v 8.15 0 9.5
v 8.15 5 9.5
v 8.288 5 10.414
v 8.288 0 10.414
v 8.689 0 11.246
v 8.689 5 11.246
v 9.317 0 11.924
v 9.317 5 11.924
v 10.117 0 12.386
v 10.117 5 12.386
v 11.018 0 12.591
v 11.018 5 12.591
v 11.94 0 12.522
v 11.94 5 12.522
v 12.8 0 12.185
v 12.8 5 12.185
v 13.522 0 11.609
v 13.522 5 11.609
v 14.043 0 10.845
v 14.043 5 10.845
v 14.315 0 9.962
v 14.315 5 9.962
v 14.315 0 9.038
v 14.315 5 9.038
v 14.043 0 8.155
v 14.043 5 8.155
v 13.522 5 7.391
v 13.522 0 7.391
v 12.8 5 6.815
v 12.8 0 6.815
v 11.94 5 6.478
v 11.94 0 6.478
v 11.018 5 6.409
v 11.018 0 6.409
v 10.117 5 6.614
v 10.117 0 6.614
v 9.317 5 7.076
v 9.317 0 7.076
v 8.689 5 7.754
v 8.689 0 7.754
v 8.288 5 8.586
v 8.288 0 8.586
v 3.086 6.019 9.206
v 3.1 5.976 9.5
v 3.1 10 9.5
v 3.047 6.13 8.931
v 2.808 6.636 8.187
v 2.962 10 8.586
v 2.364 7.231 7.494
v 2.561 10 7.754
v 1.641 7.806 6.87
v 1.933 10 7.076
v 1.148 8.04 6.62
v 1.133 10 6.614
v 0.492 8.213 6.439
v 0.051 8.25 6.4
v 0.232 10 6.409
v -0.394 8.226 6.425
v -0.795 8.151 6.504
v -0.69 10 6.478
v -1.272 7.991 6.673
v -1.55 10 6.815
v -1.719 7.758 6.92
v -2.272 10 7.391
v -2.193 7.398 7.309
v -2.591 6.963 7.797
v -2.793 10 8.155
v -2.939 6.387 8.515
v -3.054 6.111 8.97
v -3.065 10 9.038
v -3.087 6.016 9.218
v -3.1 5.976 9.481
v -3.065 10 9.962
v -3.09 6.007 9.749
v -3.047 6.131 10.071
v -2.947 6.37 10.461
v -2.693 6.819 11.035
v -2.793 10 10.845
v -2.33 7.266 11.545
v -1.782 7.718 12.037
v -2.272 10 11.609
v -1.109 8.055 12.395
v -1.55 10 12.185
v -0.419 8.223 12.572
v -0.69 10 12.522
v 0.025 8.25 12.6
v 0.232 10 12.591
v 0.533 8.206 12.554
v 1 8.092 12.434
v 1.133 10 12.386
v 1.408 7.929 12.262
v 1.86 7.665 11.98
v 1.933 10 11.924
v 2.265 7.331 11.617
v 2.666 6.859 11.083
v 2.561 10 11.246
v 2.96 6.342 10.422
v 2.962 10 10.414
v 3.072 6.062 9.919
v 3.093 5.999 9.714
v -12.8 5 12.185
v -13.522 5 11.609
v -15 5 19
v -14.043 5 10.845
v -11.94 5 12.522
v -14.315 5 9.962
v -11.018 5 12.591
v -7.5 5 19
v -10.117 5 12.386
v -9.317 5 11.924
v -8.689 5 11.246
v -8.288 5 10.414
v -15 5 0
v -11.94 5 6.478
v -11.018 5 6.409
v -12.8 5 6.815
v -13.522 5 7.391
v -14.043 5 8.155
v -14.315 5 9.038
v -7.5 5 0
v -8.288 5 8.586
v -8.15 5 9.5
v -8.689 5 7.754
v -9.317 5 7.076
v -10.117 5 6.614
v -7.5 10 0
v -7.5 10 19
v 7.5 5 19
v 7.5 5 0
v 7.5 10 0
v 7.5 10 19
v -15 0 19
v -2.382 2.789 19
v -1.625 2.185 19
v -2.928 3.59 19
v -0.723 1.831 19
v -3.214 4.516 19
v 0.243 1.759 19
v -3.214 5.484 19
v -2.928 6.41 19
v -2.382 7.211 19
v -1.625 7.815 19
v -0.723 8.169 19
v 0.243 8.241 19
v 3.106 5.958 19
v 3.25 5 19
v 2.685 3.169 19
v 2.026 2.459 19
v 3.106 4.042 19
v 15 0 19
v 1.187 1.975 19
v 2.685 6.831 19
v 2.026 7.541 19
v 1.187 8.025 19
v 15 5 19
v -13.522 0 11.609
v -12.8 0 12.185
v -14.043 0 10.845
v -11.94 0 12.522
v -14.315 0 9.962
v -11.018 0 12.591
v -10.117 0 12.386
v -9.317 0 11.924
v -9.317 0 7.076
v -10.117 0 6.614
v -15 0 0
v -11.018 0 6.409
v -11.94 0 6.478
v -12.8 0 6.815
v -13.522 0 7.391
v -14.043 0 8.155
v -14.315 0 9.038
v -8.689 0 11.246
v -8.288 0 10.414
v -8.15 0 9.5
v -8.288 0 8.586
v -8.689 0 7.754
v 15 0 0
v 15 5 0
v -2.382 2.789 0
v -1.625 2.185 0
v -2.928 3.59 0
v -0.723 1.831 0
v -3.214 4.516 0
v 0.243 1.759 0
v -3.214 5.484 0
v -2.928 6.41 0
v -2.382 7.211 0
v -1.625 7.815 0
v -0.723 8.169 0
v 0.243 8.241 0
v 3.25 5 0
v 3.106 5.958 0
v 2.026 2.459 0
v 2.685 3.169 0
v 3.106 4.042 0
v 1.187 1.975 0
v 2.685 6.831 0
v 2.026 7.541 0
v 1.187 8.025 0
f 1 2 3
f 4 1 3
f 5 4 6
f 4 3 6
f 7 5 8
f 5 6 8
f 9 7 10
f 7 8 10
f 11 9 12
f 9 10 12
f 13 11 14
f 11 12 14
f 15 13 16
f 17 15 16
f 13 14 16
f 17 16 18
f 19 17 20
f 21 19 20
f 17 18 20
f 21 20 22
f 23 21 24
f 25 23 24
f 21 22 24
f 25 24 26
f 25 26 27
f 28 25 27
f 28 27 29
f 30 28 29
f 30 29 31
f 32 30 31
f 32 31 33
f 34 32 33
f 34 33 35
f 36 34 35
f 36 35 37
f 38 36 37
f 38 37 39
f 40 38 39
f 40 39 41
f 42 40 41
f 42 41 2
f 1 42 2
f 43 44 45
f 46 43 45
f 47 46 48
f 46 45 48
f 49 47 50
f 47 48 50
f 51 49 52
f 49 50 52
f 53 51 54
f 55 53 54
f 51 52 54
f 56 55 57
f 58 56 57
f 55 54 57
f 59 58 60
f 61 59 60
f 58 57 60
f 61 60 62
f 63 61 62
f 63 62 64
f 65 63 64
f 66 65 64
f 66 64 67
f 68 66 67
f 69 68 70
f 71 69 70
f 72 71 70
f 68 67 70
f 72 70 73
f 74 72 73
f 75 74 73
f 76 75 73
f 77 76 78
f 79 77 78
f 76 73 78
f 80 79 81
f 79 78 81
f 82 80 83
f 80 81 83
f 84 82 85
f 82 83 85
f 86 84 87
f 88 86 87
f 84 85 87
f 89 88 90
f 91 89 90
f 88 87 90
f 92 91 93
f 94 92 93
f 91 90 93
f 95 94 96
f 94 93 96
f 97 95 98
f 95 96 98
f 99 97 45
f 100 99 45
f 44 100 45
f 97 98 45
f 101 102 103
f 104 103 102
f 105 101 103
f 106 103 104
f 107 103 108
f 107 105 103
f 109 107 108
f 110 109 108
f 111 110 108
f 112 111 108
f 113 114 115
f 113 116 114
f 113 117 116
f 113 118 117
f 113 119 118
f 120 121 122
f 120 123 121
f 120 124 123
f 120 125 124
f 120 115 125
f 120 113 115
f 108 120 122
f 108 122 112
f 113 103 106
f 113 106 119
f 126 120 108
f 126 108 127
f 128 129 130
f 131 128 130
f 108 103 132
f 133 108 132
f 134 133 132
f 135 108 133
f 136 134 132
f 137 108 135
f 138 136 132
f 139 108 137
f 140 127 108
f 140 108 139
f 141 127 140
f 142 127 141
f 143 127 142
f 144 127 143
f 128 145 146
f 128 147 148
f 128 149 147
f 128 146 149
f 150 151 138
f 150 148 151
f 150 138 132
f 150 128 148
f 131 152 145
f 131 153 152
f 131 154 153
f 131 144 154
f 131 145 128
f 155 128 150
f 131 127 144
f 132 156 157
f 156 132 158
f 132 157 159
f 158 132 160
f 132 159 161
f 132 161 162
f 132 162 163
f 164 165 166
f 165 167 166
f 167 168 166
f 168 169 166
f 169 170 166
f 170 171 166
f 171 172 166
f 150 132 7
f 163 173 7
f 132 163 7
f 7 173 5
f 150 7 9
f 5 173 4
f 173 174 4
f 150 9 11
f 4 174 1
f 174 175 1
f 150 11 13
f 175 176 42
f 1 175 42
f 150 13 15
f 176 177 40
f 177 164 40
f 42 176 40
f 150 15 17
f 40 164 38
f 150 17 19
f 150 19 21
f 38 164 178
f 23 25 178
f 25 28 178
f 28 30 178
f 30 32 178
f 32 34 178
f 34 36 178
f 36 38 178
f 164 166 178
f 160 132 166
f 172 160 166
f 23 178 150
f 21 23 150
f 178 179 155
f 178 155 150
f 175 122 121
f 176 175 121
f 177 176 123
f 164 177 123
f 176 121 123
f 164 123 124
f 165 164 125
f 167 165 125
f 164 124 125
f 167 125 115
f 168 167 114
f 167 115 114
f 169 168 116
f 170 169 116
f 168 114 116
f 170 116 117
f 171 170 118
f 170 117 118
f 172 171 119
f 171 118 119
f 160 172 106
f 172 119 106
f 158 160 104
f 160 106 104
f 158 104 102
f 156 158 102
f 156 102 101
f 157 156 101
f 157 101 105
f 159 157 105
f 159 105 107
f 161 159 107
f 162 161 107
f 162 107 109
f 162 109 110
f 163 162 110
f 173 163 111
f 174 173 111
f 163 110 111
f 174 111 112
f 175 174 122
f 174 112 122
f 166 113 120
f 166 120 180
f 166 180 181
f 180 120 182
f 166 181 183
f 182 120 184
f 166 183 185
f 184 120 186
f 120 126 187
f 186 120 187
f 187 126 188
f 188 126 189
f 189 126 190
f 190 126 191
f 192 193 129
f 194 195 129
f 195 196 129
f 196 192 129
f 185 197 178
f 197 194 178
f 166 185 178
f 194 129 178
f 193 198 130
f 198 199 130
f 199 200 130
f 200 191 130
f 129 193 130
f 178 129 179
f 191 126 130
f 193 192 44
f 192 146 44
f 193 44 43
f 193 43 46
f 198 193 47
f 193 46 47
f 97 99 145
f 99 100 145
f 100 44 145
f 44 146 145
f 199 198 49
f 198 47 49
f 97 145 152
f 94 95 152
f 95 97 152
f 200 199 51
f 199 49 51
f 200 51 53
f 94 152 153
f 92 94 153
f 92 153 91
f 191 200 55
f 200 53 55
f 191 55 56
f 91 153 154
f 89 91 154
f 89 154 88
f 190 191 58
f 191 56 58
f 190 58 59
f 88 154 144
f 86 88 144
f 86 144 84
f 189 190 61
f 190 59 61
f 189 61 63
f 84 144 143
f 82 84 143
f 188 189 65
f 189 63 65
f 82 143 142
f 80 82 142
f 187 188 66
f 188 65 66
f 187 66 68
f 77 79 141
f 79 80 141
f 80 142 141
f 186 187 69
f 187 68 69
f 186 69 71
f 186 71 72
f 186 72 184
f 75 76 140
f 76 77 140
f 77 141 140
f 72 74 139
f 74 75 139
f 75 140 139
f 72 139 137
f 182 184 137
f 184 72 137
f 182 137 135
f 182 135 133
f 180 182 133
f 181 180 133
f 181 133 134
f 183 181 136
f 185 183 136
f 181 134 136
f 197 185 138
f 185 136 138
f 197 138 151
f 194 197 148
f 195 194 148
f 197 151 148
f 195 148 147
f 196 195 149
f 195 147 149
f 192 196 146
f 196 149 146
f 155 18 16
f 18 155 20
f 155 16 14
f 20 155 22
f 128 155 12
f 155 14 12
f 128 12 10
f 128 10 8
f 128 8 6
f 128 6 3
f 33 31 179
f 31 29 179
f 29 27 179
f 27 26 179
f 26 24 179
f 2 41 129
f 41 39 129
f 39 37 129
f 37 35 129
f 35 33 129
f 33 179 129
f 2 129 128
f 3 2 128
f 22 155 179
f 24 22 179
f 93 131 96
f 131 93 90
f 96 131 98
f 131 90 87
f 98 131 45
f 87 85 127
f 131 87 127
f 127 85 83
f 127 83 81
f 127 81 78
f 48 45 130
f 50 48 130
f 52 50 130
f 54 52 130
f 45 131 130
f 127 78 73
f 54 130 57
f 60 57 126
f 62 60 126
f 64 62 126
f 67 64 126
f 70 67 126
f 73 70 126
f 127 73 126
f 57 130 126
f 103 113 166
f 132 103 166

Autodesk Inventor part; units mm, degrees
sketch "Sketch1" plane through (0, 0, 0) normal (0, 0, 1) x (1, 0, 0)
  line L0 (-15, 0) -> (15, 0)
  line L1 (-15, 5) -> (-15, 0)
  line L2 (15, 5) -> (15, 0)
  line L3 (15, 5) -> (7.5, 5)
  line L4 (-15, 5) -> (-7.5, 5)
  line L5 (-7.5, 5) -> (-7.5, 10)
  line L6 (7.5, 5) -> (7.5, 10)
  line L7 (7.5, 10) -> (-7.5, 10)
  point P0 (0, 0)
  point P1 (0, 0)
  dimension "d0" = 30
  dimension "d1" = 5
  dimension "d2" = 15
extrude "Extrusion1" add sketch "Sketch1" along normal blind 19
sketch "Sketch2" plane through (-15, 5, 0) normal (0, 1, 0) x (1, 0, 0)
  circle A0 centre (3.75, -9.5) radius 3.1
  line L0 (0, 0) -> (30, 0) projected
  line L1 (0, 0) -> (0, -19) projected
  line L2 (0, 0) -> (0, -19)
  line L3 (0, 0) -> (7.5, 0)
  point P0 (15, 0)
  point P1 (0, -9.5)
  point P2 (3.75, 0)
  dimension "d5" = 6.2
extrude "Extrusion2" cut sketch "Sketch2" against normal through all
mirror "Mirror1" about plane through (0, 0, 0) normal (1, 0, 0) of "Extrusion2"
sketch "Sketch3" plane through (0, 0, 19) normal (0, 0, 1) x (1, 0, 0)
  circle A0 centre (0, 5) radius 3.25
  line L0 (-15, 0) -> (15, 0) projected
  point P0 (0, 0)
  point P1 (0, 0)
  point P2 (-7.5, 5)
  dimension "d9" = 6.5
extrude "Extrusion3" cut sketch "Sketch3" against normal through all
sketch "Sketch4" plane through (-7.5, 10, 0) normal (0, 1, 0) x (1, 0, 0)
  circle A0 centre (7.5, -9.5) radius 3.1
  line L0 (15, 0) -> (0, 0) projected
  line L1 (0, 0) -> (0, -19) projected
  point P0 (7.5, 0)
  point P1 (7.5, 0)
  point P2 (0, -9.5)
  dimension "d12" = 6.2
extrude "Extrusion4" cut sketch "Sketch4" against normal up to next
ref_plane "Work Plane1" through (0, 0, 9.5) normal (0, 0, -1) x (-1, 0, 0)
properties part number "suporte_veio_001_001" material "Aluminum 6061"
